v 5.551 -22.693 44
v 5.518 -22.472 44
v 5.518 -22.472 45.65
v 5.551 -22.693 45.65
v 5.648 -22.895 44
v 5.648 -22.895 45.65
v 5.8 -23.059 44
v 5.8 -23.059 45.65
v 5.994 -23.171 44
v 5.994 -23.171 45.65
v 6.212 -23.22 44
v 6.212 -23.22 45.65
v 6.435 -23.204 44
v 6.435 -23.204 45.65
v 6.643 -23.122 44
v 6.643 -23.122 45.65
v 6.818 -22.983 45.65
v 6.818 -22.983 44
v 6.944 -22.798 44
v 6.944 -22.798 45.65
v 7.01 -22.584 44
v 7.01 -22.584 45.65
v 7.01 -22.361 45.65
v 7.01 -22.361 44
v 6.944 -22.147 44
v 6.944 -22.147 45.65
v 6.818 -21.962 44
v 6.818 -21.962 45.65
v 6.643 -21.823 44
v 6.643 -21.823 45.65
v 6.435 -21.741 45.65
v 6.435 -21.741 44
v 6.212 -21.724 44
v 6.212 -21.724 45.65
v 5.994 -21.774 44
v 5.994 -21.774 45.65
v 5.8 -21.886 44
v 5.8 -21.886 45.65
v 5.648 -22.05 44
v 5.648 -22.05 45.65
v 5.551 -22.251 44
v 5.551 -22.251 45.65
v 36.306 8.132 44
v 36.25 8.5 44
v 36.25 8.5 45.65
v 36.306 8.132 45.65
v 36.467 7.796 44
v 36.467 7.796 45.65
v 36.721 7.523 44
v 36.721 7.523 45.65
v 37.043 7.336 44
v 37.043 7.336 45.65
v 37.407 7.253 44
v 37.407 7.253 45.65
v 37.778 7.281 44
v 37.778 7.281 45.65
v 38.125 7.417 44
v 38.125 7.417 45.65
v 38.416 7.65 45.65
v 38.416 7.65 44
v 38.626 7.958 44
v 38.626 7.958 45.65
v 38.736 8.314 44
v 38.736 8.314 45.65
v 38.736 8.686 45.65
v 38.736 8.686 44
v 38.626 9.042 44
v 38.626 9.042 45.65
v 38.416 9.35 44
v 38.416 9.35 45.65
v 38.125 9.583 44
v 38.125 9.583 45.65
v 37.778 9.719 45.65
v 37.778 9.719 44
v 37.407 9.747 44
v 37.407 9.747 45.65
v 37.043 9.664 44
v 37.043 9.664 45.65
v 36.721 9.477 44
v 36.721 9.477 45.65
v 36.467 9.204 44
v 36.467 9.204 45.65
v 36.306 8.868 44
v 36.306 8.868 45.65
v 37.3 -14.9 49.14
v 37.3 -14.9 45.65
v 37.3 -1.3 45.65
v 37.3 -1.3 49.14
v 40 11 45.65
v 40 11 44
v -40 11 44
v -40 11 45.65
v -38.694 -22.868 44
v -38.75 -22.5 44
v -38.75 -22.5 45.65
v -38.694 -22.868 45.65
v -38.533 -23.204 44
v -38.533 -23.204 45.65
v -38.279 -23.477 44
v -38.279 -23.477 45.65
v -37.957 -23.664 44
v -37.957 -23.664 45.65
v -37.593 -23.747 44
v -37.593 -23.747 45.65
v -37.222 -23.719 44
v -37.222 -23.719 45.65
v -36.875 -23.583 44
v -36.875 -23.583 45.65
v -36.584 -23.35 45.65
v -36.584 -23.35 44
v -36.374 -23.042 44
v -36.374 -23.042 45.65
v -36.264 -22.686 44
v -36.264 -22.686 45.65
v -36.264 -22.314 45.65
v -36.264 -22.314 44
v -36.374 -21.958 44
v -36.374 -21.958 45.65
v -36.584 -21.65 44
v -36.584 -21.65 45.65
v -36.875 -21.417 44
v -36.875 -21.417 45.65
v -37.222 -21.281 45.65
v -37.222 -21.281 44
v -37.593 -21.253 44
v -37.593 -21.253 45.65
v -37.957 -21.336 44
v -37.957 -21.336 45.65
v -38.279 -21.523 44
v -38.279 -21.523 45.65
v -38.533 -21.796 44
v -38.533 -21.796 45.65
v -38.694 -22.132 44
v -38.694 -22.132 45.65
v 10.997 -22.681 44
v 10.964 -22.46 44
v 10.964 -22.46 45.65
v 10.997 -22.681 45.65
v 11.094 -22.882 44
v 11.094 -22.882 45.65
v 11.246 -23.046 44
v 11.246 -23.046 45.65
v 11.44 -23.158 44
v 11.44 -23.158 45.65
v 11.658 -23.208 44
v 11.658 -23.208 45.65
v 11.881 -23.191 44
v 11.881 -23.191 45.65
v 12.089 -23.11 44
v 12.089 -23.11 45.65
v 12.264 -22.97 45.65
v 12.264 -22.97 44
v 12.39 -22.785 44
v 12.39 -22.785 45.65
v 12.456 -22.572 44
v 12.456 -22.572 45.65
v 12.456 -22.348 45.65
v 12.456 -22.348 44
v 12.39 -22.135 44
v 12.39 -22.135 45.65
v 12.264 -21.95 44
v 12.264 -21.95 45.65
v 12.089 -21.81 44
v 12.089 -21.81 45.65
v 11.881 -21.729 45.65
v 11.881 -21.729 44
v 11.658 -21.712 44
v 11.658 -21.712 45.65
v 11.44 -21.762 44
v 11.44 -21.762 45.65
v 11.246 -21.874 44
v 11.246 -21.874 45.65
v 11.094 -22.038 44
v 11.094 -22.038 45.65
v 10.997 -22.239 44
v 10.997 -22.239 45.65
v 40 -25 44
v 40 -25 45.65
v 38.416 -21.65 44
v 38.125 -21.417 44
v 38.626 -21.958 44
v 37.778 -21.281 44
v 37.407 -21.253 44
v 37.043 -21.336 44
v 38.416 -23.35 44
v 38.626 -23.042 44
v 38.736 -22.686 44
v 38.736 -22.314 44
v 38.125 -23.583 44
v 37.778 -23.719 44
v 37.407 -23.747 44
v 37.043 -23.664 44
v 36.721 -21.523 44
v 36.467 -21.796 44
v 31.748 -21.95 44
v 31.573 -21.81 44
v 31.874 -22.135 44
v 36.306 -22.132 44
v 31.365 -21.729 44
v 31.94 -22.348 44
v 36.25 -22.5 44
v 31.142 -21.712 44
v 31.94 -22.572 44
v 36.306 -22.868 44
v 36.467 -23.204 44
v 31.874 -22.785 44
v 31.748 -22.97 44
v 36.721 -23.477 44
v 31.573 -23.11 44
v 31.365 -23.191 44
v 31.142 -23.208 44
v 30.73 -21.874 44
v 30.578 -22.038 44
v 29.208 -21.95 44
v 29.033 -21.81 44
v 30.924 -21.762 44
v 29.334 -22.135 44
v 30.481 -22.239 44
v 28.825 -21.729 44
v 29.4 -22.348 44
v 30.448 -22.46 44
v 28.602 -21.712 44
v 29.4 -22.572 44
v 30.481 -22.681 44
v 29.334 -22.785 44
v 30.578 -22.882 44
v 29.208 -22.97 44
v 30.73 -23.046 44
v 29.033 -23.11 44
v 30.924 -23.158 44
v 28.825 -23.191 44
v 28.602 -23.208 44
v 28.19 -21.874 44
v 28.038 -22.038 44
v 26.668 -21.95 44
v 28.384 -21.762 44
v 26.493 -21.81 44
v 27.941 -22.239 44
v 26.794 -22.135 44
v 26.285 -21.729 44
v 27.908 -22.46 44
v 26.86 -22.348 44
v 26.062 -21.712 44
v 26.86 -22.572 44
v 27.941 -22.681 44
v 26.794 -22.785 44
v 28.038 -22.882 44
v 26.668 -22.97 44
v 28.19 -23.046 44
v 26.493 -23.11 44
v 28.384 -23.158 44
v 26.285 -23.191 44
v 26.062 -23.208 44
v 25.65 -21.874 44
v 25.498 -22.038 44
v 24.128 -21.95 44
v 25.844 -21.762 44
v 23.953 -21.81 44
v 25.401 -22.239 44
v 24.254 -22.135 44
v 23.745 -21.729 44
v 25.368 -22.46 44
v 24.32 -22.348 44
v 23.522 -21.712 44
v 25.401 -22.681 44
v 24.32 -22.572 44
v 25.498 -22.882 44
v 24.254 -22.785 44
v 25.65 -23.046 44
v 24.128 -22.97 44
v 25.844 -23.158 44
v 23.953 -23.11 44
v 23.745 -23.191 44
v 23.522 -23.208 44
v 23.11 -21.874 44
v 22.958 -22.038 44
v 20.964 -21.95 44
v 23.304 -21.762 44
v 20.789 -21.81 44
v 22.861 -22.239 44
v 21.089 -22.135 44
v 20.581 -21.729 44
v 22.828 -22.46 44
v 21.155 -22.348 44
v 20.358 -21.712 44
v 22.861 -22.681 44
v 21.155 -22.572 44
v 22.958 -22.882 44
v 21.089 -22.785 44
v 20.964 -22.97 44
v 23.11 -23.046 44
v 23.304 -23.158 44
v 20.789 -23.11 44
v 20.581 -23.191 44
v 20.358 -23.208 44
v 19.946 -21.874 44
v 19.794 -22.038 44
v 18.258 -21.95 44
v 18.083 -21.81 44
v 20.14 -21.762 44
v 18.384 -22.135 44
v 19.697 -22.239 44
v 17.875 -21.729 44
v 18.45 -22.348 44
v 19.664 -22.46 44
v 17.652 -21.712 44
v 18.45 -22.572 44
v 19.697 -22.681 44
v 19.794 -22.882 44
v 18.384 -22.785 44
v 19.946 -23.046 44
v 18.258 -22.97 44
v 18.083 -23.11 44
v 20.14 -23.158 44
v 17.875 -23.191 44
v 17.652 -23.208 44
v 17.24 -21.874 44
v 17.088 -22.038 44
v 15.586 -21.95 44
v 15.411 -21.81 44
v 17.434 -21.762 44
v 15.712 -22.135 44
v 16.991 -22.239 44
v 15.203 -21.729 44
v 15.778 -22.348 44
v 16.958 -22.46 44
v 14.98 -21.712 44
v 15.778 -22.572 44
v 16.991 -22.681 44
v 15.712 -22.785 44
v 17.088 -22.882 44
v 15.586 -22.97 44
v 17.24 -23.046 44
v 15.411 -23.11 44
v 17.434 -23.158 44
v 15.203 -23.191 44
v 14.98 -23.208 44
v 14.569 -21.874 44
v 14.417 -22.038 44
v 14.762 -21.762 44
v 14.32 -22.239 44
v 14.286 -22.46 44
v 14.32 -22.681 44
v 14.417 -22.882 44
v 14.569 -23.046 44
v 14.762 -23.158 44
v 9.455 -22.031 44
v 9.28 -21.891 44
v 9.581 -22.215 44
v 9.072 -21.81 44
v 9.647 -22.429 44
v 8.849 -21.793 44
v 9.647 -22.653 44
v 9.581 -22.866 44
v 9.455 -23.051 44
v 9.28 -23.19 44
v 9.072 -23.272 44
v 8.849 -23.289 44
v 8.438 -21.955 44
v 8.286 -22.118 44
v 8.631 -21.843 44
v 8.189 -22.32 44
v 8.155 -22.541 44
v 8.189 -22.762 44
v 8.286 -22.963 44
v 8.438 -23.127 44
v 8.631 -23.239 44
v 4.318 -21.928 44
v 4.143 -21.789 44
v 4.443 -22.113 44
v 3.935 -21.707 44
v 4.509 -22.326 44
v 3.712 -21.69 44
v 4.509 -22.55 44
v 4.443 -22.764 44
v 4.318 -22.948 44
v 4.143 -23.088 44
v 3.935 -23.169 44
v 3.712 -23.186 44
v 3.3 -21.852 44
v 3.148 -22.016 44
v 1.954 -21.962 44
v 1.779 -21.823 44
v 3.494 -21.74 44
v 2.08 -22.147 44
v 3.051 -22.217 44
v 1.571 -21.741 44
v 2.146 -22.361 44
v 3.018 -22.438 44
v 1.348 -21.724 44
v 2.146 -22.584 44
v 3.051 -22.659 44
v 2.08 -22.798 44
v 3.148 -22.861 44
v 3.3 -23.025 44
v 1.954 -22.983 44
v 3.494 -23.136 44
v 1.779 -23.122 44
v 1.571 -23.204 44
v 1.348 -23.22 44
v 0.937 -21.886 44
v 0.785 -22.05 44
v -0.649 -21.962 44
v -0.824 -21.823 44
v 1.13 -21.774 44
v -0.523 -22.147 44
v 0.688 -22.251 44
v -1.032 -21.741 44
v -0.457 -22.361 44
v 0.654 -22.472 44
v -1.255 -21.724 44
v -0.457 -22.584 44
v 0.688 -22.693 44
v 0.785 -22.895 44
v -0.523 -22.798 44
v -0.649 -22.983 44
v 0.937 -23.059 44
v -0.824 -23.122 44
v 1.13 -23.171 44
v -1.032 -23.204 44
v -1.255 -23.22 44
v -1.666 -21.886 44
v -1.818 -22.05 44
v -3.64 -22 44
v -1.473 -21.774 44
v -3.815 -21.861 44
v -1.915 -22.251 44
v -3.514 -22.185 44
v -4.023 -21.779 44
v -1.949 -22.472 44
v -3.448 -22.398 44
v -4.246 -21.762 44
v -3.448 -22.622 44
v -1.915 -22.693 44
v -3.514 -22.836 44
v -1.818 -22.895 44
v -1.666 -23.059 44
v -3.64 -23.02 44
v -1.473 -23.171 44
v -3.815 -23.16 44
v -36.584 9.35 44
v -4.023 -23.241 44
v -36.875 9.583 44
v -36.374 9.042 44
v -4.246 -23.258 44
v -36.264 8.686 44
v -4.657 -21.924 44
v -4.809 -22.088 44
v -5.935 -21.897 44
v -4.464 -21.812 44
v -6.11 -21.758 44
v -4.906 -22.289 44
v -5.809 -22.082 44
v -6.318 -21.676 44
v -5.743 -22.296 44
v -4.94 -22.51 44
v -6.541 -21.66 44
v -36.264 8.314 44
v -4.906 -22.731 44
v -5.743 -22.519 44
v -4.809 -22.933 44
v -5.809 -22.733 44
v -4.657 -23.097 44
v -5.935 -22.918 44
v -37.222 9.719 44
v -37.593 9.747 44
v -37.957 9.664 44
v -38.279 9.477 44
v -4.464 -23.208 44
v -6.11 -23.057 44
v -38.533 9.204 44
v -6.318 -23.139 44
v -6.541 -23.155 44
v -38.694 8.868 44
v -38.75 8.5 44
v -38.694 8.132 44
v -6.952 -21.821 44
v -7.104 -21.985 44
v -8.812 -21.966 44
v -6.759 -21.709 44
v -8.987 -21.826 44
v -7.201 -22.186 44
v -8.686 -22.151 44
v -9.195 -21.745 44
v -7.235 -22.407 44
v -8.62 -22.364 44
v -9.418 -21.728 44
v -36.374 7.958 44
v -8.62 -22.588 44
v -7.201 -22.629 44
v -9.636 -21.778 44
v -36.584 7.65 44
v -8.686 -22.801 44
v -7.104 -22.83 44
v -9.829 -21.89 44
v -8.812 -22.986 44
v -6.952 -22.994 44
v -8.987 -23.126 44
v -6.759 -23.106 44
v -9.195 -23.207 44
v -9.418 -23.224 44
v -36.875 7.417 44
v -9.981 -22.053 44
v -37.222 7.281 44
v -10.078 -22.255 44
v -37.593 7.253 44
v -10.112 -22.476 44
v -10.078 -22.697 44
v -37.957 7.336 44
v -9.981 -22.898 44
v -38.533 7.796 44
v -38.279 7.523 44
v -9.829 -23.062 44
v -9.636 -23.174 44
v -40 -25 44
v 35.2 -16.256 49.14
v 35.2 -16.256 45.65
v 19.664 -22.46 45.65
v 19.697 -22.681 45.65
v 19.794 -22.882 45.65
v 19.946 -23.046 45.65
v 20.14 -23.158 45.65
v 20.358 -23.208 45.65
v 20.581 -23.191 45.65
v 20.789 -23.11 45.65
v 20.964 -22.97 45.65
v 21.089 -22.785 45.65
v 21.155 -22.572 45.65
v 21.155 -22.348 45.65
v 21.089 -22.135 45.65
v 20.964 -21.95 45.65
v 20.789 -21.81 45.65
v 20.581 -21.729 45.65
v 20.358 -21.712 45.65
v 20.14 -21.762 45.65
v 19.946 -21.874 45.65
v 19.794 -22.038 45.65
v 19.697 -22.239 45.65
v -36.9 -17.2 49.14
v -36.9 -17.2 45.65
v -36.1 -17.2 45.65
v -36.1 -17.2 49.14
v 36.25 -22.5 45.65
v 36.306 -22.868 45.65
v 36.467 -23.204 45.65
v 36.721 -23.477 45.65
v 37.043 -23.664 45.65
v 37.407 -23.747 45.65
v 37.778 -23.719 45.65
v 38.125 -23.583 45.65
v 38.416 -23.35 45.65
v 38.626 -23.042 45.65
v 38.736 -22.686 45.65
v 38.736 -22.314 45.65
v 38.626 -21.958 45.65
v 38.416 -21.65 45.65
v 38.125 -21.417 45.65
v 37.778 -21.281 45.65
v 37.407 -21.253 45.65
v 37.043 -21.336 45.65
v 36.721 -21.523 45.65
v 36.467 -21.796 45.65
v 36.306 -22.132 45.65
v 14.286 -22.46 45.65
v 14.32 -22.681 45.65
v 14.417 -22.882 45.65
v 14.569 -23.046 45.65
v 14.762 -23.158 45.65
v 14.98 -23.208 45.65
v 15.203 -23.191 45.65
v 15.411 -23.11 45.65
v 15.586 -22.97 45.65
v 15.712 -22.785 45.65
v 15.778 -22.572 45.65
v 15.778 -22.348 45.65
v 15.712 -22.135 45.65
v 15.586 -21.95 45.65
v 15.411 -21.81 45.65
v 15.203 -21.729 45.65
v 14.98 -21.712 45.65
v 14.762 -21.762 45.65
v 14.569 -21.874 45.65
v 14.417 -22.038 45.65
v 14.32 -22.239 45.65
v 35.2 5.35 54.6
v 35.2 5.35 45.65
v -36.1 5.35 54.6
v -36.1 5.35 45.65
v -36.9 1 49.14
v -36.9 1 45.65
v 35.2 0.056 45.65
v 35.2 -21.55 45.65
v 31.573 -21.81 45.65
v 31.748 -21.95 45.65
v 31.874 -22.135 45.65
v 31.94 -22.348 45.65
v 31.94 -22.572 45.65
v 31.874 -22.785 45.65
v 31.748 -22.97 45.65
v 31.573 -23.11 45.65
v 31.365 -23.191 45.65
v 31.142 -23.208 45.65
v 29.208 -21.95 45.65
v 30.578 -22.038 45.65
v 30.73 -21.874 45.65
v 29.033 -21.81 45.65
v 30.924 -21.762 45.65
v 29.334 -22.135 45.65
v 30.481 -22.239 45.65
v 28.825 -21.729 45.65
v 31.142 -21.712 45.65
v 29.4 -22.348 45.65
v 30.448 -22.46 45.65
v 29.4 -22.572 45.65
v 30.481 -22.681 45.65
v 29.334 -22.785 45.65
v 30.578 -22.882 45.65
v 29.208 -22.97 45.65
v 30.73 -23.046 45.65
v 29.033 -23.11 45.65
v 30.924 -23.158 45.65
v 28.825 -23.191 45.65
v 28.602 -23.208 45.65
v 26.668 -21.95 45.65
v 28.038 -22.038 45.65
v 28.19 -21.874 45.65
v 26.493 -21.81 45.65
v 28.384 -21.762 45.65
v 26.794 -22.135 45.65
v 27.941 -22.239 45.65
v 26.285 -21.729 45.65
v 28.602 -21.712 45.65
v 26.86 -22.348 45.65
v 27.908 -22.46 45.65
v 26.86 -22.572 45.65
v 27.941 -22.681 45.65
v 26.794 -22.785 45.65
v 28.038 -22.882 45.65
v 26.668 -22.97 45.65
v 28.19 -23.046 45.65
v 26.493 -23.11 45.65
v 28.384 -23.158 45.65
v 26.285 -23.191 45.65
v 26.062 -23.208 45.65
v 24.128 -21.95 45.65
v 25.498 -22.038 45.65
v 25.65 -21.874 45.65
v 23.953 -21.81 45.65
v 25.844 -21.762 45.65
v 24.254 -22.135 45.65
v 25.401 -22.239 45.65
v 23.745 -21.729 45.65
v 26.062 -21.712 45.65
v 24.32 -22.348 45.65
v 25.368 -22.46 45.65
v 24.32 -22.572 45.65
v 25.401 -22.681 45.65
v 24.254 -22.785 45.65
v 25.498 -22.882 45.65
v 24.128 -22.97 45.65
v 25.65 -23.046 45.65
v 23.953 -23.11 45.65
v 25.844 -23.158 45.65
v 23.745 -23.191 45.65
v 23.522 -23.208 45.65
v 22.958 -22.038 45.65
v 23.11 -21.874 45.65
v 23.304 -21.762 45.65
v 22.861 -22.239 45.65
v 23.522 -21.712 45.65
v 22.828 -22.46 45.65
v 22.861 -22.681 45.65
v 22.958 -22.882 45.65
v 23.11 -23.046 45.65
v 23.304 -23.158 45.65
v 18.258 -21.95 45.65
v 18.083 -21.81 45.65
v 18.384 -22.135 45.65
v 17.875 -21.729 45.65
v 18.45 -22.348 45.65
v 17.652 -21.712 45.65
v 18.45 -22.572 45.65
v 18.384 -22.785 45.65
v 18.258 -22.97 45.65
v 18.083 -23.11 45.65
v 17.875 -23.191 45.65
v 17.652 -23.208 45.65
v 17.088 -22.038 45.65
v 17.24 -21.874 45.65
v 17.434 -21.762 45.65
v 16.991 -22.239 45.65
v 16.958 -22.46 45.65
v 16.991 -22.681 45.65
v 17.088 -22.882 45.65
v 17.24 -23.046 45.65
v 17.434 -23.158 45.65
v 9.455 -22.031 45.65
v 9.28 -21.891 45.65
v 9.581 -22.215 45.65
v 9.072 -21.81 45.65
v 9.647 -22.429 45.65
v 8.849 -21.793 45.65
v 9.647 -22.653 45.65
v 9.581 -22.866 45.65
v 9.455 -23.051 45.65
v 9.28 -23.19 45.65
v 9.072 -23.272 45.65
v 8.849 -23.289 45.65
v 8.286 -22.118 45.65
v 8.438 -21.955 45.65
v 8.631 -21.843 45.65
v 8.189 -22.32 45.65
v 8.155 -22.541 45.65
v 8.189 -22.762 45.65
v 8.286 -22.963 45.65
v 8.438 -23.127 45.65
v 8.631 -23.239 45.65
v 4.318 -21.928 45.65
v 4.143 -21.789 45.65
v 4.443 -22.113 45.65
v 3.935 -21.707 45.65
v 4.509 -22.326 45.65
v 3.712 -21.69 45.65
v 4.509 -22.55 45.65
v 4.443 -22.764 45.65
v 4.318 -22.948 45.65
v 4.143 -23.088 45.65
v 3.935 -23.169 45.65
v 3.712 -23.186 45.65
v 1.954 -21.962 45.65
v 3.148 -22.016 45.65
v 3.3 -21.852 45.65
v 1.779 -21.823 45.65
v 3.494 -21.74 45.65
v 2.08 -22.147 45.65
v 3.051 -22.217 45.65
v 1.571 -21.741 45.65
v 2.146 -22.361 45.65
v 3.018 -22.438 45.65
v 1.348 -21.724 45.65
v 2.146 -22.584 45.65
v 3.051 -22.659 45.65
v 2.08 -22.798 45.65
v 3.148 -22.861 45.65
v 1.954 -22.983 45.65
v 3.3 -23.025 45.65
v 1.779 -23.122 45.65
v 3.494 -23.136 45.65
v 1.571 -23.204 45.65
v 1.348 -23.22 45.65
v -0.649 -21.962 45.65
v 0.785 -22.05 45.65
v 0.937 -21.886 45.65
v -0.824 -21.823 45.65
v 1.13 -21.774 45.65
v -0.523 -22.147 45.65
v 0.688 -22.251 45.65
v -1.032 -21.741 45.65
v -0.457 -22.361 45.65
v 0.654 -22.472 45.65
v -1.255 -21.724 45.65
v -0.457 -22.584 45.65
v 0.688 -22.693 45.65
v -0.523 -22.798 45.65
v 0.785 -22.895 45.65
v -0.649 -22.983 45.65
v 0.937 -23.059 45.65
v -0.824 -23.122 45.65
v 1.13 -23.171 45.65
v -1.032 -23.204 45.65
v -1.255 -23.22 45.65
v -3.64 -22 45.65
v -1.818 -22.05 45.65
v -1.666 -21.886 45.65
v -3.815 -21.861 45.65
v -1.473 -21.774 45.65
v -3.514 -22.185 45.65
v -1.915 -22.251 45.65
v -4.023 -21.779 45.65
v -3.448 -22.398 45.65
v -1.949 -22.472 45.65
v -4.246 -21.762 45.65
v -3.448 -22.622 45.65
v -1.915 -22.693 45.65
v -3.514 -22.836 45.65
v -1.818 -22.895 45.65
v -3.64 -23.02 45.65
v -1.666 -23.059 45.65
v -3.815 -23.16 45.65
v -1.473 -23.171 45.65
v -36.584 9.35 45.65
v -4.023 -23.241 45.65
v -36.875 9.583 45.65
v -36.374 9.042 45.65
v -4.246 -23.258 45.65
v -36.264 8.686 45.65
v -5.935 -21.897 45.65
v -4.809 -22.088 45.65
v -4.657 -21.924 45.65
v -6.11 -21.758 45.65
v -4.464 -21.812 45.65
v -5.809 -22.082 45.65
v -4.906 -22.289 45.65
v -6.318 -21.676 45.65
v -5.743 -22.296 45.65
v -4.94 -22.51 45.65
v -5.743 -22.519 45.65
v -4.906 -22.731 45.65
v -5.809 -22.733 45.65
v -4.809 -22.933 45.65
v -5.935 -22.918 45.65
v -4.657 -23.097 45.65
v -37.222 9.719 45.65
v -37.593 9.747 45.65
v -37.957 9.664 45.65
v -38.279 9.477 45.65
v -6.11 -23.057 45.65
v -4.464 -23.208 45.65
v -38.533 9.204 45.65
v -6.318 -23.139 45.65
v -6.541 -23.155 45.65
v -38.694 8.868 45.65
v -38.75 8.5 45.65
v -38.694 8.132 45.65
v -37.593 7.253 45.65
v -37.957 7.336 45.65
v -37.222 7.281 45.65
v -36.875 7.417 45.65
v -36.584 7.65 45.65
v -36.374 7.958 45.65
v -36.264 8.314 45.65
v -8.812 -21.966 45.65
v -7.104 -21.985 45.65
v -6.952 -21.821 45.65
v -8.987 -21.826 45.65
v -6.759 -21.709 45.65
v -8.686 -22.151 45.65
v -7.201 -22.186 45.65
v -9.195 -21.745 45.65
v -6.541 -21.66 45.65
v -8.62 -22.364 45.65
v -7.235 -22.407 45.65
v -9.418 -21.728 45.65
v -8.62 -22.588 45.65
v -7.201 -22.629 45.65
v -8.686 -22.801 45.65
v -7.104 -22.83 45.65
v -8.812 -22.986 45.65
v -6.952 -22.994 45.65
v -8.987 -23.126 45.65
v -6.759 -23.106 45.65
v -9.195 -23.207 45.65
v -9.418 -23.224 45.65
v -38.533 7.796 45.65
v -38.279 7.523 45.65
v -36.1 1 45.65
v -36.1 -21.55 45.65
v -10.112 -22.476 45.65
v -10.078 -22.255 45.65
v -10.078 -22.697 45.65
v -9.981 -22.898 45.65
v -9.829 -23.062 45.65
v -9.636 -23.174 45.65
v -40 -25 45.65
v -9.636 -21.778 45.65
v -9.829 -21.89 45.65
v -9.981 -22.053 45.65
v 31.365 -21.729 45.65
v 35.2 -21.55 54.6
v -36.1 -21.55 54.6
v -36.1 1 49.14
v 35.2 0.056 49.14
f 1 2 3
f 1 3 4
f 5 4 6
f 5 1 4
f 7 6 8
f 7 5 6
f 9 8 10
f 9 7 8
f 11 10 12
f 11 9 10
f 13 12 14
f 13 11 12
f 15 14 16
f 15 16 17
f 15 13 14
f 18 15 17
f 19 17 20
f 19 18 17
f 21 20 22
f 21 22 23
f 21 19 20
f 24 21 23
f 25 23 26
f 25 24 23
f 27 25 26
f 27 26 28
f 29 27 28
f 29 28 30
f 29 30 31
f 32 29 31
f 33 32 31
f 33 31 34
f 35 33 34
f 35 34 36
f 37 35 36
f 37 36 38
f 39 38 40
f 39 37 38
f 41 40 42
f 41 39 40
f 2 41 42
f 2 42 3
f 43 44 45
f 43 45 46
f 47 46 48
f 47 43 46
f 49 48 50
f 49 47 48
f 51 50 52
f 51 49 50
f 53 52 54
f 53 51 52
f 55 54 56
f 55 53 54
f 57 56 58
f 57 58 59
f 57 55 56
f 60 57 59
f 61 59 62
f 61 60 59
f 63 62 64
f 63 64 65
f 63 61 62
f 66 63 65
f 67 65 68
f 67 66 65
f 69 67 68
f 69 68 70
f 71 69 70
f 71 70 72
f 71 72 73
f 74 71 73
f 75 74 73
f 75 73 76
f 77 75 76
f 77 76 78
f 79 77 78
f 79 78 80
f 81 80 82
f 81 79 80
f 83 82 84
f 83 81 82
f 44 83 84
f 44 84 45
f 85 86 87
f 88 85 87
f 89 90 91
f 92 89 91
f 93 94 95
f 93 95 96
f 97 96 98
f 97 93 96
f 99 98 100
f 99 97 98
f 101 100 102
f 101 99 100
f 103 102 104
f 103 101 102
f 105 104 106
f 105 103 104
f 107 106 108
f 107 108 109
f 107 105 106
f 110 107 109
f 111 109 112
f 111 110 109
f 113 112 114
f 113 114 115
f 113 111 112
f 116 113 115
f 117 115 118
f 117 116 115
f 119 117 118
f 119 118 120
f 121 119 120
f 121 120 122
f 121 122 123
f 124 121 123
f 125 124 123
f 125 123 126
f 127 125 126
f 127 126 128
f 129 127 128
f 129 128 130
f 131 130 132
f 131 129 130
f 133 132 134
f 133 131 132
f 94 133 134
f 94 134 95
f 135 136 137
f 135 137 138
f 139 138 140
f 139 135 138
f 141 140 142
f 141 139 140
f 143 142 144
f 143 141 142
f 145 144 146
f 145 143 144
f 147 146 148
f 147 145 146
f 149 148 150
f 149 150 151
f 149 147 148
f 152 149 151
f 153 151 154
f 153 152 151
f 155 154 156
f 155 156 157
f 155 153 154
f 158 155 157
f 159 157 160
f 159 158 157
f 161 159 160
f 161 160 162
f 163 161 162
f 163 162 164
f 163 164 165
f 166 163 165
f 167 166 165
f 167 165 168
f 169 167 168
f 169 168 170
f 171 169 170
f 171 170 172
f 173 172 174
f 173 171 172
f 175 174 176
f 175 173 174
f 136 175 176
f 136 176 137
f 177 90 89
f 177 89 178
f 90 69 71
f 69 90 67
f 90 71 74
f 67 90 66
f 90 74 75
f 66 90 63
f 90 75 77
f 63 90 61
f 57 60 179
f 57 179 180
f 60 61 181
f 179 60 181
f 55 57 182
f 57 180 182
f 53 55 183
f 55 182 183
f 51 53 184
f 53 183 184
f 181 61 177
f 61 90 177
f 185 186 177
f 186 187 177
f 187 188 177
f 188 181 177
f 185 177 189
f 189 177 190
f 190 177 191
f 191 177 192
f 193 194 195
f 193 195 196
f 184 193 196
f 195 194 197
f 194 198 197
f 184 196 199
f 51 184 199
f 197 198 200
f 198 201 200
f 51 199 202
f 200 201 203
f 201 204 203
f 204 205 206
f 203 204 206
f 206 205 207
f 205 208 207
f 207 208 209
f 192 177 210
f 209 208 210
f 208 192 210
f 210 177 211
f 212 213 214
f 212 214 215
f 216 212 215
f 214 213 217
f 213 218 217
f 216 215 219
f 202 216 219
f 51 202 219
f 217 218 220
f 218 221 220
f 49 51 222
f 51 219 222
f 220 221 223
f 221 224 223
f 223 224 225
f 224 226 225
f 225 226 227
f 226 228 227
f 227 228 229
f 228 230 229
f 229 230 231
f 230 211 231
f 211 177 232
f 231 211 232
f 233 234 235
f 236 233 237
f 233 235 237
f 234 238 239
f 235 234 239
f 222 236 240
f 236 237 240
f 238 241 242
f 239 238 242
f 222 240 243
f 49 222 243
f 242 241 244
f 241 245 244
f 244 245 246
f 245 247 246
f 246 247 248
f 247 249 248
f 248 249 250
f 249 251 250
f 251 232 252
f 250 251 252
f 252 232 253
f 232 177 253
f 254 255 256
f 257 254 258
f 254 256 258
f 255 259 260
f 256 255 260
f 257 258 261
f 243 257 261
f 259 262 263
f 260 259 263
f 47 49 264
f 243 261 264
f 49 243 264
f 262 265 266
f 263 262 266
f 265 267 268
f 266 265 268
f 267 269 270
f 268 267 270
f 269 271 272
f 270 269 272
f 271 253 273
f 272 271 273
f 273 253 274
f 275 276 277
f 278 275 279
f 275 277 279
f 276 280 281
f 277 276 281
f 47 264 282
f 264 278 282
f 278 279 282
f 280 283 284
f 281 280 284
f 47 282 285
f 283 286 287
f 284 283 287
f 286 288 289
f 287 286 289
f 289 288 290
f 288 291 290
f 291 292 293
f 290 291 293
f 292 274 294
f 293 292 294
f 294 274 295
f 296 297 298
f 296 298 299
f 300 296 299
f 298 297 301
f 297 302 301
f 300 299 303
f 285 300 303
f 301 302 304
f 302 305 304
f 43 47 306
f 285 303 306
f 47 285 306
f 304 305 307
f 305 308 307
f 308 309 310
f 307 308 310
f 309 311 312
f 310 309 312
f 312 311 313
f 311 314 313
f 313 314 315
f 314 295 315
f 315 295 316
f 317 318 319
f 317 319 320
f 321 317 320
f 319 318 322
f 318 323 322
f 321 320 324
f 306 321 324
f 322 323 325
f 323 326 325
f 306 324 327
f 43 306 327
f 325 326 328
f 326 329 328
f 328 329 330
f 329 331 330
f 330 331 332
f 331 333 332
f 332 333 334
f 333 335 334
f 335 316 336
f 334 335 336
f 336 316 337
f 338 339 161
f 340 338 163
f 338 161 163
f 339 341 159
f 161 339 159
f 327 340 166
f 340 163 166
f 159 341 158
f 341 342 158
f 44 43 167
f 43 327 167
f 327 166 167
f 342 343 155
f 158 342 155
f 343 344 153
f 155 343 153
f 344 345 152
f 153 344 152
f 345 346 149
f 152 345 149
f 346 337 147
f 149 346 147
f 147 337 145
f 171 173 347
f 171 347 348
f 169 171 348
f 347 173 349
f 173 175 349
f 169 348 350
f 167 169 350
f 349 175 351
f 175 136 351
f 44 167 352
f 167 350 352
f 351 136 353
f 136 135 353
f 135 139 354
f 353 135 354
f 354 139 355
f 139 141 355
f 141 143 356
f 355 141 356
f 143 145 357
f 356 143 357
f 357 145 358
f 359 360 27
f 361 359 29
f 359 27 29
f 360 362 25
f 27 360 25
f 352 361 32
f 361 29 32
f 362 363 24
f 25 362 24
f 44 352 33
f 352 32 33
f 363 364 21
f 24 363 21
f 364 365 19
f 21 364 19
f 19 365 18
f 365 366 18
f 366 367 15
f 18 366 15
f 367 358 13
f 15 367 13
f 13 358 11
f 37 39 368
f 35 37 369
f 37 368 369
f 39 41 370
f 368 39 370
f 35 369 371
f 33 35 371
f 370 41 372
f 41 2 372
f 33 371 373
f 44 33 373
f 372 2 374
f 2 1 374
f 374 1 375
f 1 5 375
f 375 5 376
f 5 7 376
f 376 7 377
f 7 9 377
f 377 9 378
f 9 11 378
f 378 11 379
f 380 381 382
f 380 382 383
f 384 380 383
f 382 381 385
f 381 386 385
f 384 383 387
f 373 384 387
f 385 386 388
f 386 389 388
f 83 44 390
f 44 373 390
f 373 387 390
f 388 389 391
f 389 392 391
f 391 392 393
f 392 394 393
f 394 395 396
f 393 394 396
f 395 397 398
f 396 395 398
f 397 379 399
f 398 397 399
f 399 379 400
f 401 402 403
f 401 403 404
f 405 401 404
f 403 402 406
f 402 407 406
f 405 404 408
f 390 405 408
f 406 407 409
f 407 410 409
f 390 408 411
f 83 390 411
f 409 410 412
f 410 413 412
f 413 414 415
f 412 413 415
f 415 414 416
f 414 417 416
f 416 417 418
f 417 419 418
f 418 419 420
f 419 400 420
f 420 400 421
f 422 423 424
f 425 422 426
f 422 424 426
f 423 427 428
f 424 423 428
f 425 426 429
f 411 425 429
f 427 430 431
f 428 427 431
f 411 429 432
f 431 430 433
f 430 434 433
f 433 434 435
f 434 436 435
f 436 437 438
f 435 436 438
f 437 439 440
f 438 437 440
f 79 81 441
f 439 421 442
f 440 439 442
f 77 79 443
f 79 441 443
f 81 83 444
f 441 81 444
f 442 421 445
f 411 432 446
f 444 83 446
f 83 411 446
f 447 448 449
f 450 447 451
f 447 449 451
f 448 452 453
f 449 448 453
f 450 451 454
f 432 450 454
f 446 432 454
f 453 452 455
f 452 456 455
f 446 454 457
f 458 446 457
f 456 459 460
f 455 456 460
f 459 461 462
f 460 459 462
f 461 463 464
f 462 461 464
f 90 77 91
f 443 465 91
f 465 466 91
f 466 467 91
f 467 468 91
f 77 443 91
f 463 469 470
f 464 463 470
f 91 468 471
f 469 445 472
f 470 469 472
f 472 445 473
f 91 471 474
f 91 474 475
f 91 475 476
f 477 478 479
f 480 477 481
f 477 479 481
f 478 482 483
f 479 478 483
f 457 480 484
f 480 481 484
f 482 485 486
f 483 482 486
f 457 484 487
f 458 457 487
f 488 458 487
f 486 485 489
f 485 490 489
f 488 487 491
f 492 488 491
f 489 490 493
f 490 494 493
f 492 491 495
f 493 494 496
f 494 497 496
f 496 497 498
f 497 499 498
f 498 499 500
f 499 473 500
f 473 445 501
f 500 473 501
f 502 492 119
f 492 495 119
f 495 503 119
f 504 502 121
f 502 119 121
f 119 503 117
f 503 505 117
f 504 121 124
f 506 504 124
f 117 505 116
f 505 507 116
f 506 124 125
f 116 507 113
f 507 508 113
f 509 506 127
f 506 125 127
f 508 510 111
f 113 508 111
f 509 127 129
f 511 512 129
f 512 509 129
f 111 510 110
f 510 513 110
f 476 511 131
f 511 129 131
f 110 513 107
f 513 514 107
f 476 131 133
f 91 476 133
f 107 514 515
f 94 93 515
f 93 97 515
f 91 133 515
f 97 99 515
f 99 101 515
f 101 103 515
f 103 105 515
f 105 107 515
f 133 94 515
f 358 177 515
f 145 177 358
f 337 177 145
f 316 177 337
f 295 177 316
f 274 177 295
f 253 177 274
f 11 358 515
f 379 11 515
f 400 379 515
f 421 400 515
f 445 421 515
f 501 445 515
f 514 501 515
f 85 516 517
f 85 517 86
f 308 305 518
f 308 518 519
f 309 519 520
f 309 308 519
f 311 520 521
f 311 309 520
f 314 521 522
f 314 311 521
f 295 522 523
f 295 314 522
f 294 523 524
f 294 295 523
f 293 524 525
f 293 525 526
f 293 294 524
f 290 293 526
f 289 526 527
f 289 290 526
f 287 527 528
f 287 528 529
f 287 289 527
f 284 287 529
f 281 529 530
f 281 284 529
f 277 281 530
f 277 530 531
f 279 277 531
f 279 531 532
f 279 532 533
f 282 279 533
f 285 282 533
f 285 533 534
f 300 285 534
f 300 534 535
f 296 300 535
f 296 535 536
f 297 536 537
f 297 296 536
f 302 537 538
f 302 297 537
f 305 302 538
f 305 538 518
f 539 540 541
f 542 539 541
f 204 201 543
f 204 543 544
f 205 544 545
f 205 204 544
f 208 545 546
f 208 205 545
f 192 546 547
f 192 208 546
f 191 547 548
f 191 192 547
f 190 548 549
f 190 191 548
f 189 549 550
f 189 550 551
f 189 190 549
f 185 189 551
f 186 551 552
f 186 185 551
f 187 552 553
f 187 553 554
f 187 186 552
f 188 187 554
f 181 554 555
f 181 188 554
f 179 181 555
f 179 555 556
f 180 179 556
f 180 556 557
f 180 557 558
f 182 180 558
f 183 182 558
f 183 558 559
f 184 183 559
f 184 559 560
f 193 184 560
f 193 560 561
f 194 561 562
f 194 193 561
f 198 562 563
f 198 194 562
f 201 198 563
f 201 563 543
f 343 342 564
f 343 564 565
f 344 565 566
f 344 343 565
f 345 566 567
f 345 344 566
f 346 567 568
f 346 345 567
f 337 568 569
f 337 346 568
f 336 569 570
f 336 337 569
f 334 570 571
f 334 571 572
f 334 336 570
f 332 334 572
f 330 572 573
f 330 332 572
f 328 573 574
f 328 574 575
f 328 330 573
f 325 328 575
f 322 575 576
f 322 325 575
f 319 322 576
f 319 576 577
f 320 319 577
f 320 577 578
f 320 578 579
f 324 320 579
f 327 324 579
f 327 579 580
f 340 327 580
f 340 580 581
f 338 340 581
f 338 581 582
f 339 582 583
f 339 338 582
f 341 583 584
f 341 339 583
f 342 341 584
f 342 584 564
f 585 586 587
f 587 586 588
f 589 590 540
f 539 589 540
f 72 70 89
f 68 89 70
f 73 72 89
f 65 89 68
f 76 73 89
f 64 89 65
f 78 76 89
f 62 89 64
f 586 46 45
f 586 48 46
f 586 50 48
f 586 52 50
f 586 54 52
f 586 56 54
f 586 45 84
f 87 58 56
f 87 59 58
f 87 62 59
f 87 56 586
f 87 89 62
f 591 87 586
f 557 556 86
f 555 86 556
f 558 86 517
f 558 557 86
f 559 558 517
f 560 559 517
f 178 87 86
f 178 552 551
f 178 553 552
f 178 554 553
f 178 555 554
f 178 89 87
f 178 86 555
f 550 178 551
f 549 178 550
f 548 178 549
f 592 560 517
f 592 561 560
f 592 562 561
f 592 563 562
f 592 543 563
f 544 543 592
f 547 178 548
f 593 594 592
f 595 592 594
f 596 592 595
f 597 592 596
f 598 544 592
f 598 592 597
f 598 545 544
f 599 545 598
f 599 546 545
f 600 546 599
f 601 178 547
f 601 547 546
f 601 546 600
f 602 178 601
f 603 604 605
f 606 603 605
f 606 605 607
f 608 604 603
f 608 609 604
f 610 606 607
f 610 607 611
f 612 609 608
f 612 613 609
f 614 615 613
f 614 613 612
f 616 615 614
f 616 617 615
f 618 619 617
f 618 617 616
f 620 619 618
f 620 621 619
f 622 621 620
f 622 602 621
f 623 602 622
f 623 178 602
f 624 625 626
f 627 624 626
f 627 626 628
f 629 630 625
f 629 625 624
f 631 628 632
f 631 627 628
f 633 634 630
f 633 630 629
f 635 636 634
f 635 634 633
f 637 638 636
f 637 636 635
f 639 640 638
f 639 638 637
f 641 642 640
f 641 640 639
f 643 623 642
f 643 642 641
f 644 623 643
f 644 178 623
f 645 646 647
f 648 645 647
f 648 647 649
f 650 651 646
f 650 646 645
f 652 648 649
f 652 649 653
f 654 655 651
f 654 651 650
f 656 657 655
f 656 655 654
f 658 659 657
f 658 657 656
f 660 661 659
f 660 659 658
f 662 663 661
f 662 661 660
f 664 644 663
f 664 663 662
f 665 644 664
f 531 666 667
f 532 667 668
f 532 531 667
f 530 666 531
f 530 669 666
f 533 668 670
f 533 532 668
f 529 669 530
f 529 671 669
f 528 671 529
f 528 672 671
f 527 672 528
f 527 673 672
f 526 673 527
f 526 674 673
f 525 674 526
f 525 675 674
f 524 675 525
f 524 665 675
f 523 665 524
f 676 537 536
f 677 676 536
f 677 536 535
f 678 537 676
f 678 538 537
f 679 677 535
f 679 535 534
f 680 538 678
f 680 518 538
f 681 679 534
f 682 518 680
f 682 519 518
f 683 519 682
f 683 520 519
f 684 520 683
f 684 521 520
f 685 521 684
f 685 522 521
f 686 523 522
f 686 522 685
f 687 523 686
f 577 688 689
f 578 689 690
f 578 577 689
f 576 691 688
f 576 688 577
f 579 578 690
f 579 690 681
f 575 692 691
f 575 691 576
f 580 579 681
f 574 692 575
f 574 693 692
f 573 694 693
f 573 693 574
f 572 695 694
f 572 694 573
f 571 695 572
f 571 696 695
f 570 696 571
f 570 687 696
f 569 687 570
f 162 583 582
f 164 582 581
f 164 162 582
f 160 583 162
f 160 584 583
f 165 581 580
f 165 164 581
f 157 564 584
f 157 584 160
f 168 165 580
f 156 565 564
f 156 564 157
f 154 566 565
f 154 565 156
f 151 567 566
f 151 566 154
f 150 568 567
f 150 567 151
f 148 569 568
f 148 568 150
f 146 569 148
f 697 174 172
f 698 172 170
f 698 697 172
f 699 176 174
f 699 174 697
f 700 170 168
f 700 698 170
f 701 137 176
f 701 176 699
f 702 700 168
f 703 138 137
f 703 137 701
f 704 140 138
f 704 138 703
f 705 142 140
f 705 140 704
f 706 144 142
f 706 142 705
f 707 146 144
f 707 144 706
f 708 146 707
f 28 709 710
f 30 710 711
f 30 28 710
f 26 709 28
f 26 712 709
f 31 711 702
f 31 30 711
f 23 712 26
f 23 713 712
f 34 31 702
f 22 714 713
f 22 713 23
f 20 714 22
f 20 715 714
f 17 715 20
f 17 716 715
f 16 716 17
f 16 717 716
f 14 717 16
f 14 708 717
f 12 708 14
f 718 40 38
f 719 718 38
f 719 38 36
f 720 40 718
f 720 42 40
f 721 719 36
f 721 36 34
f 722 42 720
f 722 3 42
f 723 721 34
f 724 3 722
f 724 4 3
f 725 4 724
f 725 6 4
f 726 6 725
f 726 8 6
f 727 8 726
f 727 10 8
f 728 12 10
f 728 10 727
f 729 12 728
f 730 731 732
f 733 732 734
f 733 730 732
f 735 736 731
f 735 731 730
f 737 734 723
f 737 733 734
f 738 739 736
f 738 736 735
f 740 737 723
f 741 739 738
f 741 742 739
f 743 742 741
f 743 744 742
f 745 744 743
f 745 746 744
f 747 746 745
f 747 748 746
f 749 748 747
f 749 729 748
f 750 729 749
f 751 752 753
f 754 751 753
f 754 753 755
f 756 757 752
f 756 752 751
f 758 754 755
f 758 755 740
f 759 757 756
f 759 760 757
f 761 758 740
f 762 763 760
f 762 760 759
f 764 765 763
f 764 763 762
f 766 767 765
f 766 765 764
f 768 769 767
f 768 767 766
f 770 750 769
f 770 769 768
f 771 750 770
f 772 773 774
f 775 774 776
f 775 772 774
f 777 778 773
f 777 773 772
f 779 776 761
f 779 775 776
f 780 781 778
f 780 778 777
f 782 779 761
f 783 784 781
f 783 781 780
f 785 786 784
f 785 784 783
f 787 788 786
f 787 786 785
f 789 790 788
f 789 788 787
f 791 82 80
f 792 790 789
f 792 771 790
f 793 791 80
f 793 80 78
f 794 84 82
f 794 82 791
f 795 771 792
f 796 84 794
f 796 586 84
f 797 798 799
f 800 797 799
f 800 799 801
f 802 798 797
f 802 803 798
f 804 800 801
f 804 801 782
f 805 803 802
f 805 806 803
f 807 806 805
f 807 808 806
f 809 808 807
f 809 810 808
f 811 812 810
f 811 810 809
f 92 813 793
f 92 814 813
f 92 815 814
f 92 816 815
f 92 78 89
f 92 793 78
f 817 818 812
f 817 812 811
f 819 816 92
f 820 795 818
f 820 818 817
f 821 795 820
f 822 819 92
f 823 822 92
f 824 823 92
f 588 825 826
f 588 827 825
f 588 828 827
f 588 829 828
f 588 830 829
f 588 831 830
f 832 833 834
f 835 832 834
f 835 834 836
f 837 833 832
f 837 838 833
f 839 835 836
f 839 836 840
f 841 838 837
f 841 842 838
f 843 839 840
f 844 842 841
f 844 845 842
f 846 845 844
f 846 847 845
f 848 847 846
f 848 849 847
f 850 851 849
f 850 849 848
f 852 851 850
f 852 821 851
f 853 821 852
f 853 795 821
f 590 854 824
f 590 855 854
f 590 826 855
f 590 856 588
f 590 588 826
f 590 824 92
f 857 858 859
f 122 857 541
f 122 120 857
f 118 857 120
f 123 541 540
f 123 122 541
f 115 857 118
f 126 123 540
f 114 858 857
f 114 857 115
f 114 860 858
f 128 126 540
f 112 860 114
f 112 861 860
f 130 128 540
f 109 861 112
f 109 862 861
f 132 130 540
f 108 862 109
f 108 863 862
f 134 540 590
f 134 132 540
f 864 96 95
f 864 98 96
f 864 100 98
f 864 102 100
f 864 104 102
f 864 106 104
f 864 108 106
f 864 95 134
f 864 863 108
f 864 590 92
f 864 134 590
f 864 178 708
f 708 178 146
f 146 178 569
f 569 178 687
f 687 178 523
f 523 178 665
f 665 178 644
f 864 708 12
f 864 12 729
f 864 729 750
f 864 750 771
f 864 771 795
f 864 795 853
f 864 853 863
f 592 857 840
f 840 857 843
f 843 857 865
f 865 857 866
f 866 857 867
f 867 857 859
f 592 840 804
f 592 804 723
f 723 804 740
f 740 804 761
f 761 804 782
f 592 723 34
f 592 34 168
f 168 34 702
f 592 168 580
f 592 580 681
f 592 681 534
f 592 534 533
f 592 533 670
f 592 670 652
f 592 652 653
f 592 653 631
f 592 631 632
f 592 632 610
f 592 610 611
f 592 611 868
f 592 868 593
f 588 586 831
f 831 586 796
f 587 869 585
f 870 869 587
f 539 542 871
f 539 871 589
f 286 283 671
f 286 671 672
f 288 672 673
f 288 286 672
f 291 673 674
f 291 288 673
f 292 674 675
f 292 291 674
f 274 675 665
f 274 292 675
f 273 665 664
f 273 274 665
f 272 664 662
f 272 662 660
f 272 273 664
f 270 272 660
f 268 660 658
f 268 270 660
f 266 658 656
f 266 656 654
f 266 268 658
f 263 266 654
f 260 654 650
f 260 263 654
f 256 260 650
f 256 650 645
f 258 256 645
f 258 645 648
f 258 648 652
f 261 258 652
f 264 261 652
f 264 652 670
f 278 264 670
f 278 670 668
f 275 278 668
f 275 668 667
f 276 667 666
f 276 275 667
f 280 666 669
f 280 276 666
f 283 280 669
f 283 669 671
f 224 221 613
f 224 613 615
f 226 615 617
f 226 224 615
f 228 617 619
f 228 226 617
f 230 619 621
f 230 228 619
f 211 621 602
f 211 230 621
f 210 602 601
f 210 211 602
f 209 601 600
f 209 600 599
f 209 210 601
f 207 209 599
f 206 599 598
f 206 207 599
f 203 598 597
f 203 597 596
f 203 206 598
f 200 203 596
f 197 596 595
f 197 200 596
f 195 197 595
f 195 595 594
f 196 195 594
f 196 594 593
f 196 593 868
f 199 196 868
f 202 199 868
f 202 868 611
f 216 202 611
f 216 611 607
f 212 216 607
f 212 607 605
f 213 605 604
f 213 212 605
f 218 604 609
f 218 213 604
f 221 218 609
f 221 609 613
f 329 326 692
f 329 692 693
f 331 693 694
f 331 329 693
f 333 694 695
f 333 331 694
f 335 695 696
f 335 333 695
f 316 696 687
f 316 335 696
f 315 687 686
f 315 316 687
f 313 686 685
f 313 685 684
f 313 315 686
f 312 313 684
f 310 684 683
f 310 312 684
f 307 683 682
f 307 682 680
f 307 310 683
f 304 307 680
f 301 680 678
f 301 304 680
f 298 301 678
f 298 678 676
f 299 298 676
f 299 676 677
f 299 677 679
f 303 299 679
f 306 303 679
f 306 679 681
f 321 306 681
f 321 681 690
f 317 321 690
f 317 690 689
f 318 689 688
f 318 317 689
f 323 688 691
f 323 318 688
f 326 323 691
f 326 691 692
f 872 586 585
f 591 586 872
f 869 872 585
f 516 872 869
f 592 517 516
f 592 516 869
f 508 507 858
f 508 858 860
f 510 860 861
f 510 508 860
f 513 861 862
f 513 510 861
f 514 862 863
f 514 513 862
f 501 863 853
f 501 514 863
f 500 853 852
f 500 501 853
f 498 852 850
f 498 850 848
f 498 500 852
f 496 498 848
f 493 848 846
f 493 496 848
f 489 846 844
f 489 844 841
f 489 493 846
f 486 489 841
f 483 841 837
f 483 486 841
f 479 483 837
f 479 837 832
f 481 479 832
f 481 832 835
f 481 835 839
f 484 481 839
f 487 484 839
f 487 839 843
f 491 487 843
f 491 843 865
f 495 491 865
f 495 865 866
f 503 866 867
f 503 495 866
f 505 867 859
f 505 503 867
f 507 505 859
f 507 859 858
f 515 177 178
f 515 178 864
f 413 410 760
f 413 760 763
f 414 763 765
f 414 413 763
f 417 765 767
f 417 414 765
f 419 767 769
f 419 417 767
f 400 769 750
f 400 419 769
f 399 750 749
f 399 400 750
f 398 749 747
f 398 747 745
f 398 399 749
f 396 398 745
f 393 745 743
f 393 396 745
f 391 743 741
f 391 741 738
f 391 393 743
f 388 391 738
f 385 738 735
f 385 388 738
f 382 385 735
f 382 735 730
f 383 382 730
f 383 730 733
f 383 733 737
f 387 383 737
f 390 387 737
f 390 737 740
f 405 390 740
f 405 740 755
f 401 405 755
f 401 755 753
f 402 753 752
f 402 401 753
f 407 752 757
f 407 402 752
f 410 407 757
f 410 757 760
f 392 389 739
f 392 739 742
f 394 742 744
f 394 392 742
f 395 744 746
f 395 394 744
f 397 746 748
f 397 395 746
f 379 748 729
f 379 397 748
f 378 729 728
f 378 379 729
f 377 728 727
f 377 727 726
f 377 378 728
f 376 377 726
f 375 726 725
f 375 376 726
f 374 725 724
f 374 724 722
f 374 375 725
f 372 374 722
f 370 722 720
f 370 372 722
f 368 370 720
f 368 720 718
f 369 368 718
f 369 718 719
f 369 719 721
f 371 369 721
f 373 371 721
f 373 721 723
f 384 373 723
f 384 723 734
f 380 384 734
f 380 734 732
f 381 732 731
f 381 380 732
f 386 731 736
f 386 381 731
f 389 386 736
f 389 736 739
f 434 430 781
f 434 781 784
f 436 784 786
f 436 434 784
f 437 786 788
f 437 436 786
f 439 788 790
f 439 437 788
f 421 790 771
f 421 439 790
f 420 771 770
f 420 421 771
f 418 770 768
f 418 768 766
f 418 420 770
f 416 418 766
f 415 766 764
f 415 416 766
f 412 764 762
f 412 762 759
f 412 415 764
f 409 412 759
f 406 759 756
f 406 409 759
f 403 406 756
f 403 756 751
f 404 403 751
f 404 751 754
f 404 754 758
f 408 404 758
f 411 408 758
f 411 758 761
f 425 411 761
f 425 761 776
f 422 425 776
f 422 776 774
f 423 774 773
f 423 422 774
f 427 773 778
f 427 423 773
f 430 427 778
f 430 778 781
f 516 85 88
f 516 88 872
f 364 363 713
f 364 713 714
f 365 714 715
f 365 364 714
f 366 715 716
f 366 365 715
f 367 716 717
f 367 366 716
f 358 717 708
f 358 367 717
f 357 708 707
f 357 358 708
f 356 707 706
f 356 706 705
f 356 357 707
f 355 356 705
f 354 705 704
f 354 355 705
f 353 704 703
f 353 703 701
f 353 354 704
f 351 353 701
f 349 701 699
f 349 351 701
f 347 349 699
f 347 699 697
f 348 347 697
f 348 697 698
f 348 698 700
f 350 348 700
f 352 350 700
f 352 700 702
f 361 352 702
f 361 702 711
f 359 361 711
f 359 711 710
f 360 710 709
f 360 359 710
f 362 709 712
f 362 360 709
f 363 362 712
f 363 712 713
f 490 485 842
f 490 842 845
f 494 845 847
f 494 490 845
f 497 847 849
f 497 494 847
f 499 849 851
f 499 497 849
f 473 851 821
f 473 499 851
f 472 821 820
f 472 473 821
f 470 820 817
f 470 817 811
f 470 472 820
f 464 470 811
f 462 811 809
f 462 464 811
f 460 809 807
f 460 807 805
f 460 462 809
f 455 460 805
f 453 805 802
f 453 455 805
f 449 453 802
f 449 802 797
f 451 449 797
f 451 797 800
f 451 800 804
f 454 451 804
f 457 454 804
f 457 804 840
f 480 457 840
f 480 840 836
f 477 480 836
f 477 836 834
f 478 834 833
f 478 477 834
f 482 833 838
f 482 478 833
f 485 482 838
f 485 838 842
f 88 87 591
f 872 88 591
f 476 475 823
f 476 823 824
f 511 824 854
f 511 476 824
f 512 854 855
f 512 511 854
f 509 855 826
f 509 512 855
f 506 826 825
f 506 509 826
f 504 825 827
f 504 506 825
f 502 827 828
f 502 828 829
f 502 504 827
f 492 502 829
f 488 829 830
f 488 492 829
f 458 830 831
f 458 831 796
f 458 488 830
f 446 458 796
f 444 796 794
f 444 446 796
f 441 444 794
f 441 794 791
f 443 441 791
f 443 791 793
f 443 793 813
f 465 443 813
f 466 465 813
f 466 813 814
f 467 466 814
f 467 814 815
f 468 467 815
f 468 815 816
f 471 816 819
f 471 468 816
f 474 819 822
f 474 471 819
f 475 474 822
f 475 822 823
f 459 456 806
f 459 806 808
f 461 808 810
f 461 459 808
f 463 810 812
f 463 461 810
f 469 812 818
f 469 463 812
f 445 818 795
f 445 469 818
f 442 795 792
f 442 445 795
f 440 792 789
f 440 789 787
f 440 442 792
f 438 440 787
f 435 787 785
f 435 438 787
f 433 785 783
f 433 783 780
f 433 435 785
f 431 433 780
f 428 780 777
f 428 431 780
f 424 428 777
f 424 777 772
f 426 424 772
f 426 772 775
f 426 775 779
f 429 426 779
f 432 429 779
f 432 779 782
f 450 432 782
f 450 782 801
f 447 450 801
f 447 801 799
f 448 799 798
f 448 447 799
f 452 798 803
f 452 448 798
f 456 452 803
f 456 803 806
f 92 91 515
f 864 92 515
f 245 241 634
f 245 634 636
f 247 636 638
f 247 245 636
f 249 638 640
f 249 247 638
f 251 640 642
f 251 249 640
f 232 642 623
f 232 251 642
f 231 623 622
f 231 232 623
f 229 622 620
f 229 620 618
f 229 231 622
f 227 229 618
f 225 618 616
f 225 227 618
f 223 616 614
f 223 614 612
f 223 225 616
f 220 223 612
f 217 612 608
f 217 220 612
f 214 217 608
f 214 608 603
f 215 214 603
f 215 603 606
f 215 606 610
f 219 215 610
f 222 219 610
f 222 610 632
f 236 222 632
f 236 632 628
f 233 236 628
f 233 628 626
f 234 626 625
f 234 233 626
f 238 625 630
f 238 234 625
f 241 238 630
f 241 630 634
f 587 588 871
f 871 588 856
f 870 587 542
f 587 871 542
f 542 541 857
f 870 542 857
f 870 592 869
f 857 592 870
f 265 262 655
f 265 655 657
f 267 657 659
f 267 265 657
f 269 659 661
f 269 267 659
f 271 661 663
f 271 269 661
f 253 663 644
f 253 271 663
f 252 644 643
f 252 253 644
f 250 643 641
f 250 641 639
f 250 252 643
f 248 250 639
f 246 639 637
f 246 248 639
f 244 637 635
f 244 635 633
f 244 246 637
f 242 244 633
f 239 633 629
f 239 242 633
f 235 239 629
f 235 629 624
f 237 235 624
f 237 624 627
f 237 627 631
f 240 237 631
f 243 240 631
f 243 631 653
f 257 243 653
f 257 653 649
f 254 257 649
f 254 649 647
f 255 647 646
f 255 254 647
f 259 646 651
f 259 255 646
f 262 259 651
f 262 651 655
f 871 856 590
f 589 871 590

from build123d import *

# Parameters (mm, degrees)
PAD010002001008_DEPTH     = 5.14
SKETCH015_W               = 71.3
SKETCH015_H               = 26.9
PAD010002001007_DEPTH     = 10.6
SKETCH014_W               = 80
SKETCH014_H               = 36
SKETCH014_R               = 1.25
SKETCH014_R_2             = 0.75
PAD010002001006_DEPTH     = 1.65
FUSION006_PLACEMENT_ANGLE = 180


with BuildPart() as displayinsert:
    # Sketch016 → Pad010002001008 (new body)
    with BuildSketch(Plane(origin=(4.5, 1.1, 0), x_dir=(1, 0, 0), z_dir=(0, 0, 1))):
        Polygon((31.5, 13.45), (-31.5, 13.45), (-41.8, 6.8), (-41.8, -6.8), (-31.5, -13.45), (31.5, -13.45), (31.5, -9.1), (32.4, -9.1), (32.4, 9.1), (31.5, 9.1), align=None)
    extrude(amount=PAD010002001008_DEPTH)


with BuildPart() as displaybody:
    # Sketch015 → Pad010002001007 (new body)
    with BuildSketch(Plane(origin=(0.45, 1.1, 0), x_dir=(1, 0, 0), z_dir=(0, 0, 1))):
        Rectangle(SKETCH015_W, SKETCH015_H)
    extrude(amount=PAD010002001007_DEPTH)


with BuildPart() as display:
    # Sketch014 → Pad010002001006 (new body)
    with BuildSketch(Plane.XY):
        Rectangle(SKETCH014_W, SKETCH014_H)
        with Locations((-37.5, 15.5)):
            Circle(SKETCH014_R, mode=Mode.SUBTRACT)
        with Locations((-37.5, -15.5)):
            Circle(SKETCH014_R, mode=Mode.SUBTRACT)
        with Locations((37.5, -15.5)):
            Circle(SKETCH014_R, mode=Mode.SUBTRACT)
        with Locations((37.5, 15.5)):
            Circle(SKETCH014_R, mode=Mode.SUBTRACT)
        with Locations((-31.197892, 15.46)):
            Circle(SKETCH014_R_2, mode=Mode.SUBTRACT)
        with Locations((-28.657892, 15.46)):
            Circle(SKETCH014_R_2, mode=Mode.SUBTRACT)
        with Locations((-26.117892, 15.46)):
            Circle(SKETCH014_R_2, mode=Mode.SUBTRACT)
        with Locations((-23.577892, 15.46)):
            Circle(SKETCH014_R_2, mode=Mode.SUBTRACT)
        with Locations((-20.413733, 15.46)):
            Circle(SKETCH014_R_2, mode=Mode.SUBTRACT)
        with Locations((-17.707897, 15.46)):
            Circle(SKETCH014_R_2, mode=Mode.SUBTRACT)
        with Locations((-15.036319, 15.46)):
            Circle(SKETCH014_R_2, mode=Mode.SUBTRACT)
        with Locations((-11.713964, 15.46)):
            Circle(SKETCH014_R_2, mode=Mode.SUBTRACT)
        with Locations((-8.905379, 15.540887)):
            Circle(SKETCH014_R_2, mode=Mode.SUBTRACT)
        with Locations((-6.268049, 15.472383)):
            Circle(SKETCH014_R_2, mode=Mode.SUBTRACT)
        with Locations((-3.767722, 15.438133)):
            Circle(SKETCH014_R_2, mode=Mode.SUBTRACT)
        with Locations((-1.4044, 15.472383)):
            Circle(SKETCH014_R_2, mode=Mode.SUBTRACT)
        with Locations((1.198681, 15.472383)):
            Circle(SKETCH014_R_2, mode=Mode.SUBTRACT)
        with Locations((4.189797, 15.510243)):
            Circle(SKETCH014_R_2, mode=Mode.SUBTRACT)
        with Locations((6.484617, 15.407489)):
            Circle(SKETCH014_R_2, mode=Mode.SUBTRACT)
        with Locations((9.361704, 15.47599)):
            Circle(SKETCH014_R_2, mode=Mode.SUBTRACT)
    extrude(amount=PAD010002001006_DEPTH)

    # Fusion005: union DisplayBody
    add(displaybody.part)

    # Fusion006: union DisplayInsert
    add(displayinsert.part)


with BuildPart() as display_1:
    # Fusion006 placement: moved
    add(display.part.moved(Location((0, -7, 44))).rotate(Axis((0, -7, 44), (0, 0, 1)), FUSION006_PLACEMENT_ANGLE))


solid = display_1.part
